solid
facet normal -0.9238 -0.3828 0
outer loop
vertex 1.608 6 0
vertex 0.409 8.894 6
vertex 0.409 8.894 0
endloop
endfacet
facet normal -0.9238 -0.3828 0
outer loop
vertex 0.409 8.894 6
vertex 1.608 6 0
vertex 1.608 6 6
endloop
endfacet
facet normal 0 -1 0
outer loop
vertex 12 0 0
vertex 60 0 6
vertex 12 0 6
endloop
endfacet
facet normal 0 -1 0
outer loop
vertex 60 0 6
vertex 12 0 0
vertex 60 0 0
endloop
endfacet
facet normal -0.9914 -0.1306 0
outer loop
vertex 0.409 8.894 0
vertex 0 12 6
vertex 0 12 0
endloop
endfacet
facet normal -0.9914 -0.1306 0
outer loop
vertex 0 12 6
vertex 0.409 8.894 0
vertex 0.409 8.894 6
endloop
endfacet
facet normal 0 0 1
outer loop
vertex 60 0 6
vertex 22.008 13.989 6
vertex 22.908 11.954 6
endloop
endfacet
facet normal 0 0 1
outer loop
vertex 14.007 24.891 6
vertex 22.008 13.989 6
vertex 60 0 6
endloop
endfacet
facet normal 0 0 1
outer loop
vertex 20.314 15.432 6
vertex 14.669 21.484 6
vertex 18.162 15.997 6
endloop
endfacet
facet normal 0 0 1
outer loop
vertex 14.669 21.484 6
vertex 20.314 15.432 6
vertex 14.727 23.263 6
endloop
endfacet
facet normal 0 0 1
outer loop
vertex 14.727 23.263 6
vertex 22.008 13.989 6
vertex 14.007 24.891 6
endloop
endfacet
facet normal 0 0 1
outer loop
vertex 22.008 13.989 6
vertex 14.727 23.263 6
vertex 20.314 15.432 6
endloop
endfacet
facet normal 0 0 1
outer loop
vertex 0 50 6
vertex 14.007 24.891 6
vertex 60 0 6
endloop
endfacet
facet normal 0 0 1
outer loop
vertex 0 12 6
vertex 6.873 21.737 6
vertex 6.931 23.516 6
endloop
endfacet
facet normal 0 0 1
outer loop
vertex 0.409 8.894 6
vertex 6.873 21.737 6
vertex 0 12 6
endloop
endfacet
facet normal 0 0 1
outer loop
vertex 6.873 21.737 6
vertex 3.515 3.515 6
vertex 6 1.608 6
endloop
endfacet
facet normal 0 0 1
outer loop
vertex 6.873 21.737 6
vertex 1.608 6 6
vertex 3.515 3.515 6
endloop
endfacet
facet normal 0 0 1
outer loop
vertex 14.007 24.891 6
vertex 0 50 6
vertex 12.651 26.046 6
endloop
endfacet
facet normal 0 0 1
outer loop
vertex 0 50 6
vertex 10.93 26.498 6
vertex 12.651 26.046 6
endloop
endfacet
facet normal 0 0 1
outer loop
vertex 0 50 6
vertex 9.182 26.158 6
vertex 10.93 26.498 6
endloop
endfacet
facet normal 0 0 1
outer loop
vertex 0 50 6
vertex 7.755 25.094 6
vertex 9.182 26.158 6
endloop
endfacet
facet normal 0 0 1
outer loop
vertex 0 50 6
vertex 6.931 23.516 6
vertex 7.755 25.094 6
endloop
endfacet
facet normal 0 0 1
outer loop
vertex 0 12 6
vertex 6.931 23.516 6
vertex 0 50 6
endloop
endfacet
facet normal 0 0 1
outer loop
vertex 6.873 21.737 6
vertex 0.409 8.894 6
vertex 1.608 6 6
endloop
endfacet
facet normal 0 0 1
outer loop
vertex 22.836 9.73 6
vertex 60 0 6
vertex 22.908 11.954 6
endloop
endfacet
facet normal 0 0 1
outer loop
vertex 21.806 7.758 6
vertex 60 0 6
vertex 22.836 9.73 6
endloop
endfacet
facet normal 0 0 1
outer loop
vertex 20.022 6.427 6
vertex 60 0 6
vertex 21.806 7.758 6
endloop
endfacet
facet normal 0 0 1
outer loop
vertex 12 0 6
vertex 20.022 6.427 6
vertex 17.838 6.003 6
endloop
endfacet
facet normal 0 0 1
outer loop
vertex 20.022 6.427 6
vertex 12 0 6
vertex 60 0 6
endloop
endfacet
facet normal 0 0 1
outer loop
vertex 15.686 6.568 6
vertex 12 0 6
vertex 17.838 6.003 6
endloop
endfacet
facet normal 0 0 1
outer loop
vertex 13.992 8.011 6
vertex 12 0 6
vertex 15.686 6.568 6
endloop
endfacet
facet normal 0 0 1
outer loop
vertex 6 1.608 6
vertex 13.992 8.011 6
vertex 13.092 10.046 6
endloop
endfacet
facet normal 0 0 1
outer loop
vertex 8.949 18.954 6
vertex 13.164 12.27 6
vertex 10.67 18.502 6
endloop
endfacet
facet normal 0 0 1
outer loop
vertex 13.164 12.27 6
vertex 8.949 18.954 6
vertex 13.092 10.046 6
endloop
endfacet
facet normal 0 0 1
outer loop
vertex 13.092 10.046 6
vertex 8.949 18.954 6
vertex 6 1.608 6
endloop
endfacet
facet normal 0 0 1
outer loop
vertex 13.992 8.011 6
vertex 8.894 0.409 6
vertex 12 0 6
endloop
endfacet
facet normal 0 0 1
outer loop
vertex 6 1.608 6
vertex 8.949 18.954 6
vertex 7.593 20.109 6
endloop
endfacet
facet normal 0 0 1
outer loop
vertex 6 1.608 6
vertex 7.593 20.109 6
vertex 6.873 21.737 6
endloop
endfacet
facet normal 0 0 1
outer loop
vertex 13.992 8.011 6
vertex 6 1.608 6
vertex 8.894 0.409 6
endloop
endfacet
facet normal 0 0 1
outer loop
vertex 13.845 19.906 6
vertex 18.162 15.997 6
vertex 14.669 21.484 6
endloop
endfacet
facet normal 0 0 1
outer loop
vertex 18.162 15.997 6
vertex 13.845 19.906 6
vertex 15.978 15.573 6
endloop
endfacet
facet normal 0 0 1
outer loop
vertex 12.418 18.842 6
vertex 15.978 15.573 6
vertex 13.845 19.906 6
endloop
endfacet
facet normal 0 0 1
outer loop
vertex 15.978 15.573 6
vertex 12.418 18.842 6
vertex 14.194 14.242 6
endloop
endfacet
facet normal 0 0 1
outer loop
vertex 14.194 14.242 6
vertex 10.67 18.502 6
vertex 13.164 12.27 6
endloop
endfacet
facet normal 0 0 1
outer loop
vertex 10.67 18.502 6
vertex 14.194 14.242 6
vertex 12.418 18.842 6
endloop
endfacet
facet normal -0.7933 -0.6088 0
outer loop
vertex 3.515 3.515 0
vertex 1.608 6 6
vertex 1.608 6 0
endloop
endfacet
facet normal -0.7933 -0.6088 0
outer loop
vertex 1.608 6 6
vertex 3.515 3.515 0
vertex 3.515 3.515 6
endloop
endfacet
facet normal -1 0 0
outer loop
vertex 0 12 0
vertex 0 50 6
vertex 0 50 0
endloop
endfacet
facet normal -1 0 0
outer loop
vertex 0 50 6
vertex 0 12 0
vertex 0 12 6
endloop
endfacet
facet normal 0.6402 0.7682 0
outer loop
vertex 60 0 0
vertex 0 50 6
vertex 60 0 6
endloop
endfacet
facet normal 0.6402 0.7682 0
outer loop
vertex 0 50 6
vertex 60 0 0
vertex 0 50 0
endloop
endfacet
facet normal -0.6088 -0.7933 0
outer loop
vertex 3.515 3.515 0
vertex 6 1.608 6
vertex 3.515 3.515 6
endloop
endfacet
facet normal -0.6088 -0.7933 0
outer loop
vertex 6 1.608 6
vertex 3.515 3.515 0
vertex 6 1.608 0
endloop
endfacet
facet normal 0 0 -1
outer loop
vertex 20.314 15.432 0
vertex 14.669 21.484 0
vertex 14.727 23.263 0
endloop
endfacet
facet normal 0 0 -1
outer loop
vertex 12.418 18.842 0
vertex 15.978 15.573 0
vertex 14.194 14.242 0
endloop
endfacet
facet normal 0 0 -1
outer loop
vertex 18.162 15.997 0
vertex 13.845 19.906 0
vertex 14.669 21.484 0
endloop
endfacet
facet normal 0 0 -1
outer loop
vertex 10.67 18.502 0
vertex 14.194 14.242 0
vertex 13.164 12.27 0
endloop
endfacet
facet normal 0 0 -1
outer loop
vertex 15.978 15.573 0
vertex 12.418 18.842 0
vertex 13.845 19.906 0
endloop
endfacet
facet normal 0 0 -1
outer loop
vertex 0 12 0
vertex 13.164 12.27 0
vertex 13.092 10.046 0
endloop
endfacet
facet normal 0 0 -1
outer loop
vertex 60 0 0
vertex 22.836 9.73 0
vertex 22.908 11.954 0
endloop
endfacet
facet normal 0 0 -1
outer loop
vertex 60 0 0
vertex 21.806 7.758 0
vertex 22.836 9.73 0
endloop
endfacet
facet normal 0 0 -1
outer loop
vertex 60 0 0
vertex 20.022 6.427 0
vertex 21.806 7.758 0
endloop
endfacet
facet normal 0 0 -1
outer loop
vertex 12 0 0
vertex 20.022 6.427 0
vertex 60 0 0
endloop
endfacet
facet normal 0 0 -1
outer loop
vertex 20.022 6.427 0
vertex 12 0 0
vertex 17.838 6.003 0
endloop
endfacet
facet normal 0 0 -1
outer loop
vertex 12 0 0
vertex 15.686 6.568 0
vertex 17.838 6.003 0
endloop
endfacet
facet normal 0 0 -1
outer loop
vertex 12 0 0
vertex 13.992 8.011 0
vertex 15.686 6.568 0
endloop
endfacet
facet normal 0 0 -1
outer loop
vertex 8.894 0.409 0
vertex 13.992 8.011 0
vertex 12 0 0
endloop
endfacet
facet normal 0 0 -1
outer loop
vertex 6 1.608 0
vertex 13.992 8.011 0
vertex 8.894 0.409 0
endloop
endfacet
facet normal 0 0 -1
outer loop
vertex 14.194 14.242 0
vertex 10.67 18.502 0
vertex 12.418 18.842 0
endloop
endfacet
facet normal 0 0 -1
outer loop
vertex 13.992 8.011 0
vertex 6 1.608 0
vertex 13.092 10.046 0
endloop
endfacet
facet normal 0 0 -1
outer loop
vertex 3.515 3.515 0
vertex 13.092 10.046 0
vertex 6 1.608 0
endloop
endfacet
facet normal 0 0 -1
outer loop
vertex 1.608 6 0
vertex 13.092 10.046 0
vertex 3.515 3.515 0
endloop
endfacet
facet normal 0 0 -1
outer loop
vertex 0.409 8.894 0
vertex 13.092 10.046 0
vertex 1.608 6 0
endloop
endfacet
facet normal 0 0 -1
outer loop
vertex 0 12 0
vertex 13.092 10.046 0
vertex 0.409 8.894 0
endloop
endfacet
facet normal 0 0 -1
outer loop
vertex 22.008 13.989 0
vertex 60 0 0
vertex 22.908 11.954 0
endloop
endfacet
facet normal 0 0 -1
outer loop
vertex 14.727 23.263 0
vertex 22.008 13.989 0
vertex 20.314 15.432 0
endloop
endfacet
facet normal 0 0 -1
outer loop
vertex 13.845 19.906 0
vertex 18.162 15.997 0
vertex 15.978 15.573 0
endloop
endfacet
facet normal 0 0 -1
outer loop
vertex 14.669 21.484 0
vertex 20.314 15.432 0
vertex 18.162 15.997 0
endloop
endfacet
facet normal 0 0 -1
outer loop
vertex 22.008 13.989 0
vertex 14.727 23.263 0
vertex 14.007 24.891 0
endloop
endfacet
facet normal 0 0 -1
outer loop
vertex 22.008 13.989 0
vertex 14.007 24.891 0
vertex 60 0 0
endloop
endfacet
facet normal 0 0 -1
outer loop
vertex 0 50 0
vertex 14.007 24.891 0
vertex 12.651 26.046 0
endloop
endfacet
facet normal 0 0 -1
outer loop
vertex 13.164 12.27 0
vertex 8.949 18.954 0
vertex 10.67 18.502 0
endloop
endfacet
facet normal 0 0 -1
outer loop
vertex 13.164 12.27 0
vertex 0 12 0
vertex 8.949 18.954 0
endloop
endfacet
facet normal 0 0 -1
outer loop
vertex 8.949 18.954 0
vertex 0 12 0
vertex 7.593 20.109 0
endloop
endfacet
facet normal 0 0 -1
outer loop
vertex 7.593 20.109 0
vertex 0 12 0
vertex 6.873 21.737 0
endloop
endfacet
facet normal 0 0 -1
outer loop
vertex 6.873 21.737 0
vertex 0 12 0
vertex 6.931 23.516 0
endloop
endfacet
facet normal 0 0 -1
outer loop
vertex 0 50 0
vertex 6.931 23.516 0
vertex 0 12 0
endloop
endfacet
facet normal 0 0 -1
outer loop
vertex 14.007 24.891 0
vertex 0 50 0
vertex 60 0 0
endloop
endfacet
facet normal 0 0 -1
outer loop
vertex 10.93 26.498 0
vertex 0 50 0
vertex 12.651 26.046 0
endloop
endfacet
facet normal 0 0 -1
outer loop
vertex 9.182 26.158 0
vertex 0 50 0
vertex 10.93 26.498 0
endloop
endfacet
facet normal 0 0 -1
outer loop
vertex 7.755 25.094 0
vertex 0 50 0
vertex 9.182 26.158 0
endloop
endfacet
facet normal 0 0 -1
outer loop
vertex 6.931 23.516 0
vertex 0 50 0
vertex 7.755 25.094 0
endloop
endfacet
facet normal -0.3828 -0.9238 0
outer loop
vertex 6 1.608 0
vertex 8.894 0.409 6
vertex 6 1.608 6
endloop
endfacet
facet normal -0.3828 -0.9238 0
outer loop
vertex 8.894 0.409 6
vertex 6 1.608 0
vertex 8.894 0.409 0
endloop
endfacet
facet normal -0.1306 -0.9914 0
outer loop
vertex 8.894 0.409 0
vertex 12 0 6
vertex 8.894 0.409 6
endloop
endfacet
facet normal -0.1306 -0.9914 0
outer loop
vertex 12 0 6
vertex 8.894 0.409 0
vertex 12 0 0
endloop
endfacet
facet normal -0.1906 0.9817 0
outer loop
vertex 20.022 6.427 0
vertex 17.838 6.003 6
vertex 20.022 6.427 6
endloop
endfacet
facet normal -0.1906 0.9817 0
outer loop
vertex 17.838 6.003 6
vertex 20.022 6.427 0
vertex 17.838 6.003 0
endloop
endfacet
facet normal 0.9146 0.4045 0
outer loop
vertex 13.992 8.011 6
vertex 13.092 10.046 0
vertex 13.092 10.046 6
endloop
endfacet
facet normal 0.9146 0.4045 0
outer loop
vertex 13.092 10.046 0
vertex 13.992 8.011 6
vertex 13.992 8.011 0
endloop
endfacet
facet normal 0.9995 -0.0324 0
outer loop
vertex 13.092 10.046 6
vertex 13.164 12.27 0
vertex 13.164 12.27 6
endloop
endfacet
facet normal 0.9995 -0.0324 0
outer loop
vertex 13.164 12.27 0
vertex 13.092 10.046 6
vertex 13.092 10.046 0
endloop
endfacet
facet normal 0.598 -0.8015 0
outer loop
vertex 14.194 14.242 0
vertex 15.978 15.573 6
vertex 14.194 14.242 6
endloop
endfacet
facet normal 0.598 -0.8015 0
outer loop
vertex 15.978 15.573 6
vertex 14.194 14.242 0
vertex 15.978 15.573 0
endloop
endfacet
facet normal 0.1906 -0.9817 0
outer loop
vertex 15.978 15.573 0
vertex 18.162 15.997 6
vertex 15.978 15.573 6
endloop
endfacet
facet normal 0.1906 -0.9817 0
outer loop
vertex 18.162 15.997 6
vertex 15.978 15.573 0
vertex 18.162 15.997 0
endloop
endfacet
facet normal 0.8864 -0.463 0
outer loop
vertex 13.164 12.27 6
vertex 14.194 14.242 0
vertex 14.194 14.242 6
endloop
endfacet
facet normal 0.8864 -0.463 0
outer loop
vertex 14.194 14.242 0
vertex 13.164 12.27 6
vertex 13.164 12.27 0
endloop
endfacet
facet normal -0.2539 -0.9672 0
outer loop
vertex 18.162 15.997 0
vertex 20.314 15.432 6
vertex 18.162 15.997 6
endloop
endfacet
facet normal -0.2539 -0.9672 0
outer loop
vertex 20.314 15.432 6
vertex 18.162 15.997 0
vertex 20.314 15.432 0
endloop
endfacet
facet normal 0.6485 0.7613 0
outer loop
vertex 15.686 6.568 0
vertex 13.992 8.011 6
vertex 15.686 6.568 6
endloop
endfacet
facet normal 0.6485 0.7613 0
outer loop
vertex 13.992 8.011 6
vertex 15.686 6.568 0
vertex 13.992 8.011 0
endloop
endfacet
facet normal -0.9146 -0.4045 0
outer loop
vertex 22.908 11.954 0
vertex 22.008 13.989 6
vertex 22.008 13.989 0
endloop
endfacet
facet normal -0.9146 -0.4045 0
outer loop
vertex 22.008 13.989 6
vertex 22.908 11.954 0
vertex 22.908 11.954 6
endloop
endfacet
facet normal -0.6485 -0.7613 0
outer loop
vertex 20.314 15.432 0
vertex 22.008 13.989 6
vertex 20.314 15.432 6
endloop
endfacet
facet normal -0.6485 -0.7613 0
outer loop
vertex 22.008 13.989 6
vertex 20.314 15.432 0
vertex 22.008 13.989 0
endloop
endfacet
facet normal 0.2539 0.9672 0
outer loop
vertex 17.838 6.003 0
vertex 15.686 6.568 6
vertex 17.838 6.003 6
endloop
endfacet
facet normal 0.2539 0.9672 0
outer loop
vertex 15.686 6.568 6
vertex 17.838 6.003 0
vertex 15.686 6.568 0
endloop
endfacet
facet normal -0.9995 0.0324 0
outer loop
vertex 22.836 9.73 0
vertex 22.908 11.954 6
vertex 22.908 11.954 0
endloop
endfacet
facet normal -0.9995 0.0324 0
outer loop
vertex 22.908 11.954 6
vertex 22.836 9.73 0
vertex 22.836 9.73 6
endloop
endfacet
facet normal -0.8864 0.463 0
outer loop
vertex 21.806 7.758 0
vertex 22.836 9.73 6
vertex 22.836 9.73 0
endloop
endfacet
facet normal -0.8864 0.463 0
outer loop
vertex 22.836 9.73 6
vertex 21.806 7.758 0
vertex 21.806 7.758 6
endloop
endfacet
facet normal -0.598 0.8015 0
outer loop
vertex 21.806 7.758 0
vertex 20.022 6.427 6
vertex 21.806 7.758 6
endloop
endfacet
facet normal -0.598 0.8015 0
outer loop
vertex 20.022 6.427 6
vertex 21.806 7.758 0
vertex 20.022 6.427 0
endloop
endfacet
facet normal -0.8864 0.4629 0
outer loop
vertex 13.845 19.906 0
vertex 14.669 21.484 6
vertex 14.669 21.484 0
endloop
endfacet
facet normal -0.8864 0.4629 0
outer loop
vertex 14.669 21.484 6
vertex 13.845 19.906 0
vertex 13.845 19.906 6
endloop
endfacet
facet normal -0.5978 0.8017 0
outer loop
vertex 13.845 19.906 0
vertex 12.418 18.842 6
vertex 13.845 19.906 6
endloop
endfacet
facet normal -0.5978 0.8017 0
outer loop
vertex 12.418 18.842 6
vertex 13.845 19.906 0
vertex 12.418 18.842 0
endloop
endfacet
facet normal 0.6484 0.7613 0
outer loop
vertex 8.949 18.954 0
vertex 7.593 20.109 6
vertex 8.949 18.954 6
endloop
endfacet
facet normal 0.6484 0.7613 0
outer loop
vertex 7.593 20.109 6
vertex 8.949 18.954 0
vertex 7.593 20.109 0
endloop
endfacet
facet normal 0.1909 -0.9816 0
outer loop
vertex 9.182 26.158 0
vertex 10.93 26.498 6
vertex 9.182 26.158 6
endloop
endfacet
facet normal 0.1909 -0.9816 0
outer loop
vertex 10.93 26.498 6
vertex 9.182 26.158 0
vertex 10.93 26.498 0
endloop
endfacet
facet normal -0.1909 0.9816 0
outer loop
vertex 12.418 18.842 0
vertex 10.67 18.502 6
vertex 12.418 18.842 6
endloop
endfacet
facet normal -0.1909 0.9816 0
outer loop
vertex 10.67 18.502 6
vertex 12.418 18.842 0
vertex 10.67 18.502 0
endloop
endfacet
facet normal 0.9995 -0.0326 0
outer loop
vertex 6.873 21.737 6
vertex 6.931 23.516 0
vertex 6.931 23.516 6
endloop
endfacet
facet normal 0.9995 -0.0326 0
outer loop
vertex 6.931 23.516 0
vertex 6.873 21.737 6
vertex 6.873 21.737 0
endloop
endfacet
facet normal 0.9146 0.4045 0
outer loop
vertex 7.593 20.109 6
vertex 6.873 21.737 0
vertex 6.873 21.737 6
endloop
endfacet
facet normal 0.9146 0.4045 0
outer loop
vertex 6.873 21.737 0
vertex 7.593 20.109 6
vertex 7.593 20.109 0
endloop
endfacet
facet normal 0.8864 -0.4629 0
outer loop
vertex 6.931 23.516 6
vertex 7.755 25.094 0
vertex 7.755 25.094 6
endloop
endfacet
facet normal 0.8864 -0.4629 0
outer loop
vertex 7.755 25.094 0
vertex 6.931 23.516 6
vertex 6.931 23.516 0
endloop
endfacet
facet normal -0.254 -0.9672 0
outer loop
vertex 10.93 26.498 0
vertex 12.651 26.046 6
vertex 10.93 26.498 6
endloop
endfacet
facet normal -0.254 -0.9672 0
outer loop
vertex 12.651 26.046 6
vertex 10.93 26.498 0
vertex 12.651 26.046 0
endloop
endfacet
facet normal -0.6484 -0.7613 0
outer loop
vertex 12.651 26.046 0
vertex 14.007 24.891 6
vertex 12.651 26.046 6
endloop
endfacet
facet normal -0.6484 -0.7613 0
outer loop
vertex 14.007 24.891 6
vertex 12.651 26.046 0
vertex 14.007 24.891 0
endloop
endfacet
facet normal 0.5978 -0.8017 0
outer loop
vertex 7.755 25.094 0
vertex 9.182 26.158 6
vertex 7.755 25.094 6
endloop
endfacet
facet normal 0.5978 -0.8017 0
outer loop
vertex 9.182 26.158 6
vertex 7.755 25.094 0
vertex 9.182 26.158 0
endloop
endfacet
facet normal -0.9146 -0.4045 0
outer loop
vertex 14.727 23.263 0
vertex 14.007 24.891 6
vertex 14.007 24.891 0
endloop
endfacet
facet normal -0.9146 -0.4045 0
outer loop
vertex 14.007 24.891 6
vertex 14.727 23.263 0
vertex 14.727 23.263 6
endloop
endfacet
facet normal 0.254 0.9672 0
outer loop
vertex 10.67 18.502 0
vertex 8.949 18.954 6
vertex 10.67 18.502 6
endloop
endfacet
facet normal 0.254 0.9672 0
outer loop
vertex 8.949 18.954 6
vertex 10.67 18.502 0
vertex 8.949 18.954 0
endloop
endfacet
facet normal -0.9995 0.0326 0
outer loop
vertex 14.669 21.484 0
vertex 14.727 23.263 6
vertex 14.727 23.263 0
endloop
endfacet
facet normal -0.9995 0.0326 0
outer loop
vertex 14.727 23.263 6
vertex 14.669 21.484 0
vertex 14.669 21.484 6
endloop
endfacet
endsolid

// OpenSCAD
$fn = 32;

// ----------------------------------------------------------------------
// Bracket plate: corner pad 60 x 50, fillet R12
// ----------------------------------------------------------------------

// --- parameters (mm) ---
hole_r = 4;               // bolt hole radius
plate_t = 6;              // plate thickness, Z (extrusion height)
leg_a = 60;               // base leg
leg_b = 50;               // height leg
fillet_r = 12;            // right-angle fillet radius

hole_d1 = 2 * hole_r + 2;
hole_d2 = 2 * hole_r;

profile = [[12, 0], [60, 0], [0, 50], [0, 12], [0.409, 8.894], [1.608, 6], [3.515, 3.515], [6, 1.608], [8.894, 0.409]];  // primary outline, 9 points, counter clockwise
void_1 = [[22.908, 11.954], [22.008, 13.989], [20.314, 15.432], [18.162, 15.997], [15.978, 15.573], [14.194, 14.242], [13.164, 12.27], [13.092, 10.046], [13.992, 8.011], [15.686, 6.568], [17.838, 6.003], [20.022, 6.427], [21.806, 7.758], [22.836, 9.73]];  // mount hole 1, 14 points
void_2 = [[14.727, 23.263], [14.007, 24.891], [12.651, 26.046], [10.93, 26.498], [9.182, 26.158], [7.755, 25.094], [6.931, 23.516], [6.873, 21.737], [7.593, 20.109], [8.949, 18.954], [10.67, 18.502], [12.418, 18.842], [13.845, 19.906], [14.669, 21.484]];  // mount hole 2, 14 points

// --- the one profile operation ---
difference() {
  linear_extrude(height = plate_t) polygon(points = profile);
  translate([0, 0, -1])
    linear_extrude(height = plate_t + 2) polygon(points = void_1);
  translate([0, 0, -1])
    linear_extrude(height = plate_t + 2) polygon(points = void_2);
}
